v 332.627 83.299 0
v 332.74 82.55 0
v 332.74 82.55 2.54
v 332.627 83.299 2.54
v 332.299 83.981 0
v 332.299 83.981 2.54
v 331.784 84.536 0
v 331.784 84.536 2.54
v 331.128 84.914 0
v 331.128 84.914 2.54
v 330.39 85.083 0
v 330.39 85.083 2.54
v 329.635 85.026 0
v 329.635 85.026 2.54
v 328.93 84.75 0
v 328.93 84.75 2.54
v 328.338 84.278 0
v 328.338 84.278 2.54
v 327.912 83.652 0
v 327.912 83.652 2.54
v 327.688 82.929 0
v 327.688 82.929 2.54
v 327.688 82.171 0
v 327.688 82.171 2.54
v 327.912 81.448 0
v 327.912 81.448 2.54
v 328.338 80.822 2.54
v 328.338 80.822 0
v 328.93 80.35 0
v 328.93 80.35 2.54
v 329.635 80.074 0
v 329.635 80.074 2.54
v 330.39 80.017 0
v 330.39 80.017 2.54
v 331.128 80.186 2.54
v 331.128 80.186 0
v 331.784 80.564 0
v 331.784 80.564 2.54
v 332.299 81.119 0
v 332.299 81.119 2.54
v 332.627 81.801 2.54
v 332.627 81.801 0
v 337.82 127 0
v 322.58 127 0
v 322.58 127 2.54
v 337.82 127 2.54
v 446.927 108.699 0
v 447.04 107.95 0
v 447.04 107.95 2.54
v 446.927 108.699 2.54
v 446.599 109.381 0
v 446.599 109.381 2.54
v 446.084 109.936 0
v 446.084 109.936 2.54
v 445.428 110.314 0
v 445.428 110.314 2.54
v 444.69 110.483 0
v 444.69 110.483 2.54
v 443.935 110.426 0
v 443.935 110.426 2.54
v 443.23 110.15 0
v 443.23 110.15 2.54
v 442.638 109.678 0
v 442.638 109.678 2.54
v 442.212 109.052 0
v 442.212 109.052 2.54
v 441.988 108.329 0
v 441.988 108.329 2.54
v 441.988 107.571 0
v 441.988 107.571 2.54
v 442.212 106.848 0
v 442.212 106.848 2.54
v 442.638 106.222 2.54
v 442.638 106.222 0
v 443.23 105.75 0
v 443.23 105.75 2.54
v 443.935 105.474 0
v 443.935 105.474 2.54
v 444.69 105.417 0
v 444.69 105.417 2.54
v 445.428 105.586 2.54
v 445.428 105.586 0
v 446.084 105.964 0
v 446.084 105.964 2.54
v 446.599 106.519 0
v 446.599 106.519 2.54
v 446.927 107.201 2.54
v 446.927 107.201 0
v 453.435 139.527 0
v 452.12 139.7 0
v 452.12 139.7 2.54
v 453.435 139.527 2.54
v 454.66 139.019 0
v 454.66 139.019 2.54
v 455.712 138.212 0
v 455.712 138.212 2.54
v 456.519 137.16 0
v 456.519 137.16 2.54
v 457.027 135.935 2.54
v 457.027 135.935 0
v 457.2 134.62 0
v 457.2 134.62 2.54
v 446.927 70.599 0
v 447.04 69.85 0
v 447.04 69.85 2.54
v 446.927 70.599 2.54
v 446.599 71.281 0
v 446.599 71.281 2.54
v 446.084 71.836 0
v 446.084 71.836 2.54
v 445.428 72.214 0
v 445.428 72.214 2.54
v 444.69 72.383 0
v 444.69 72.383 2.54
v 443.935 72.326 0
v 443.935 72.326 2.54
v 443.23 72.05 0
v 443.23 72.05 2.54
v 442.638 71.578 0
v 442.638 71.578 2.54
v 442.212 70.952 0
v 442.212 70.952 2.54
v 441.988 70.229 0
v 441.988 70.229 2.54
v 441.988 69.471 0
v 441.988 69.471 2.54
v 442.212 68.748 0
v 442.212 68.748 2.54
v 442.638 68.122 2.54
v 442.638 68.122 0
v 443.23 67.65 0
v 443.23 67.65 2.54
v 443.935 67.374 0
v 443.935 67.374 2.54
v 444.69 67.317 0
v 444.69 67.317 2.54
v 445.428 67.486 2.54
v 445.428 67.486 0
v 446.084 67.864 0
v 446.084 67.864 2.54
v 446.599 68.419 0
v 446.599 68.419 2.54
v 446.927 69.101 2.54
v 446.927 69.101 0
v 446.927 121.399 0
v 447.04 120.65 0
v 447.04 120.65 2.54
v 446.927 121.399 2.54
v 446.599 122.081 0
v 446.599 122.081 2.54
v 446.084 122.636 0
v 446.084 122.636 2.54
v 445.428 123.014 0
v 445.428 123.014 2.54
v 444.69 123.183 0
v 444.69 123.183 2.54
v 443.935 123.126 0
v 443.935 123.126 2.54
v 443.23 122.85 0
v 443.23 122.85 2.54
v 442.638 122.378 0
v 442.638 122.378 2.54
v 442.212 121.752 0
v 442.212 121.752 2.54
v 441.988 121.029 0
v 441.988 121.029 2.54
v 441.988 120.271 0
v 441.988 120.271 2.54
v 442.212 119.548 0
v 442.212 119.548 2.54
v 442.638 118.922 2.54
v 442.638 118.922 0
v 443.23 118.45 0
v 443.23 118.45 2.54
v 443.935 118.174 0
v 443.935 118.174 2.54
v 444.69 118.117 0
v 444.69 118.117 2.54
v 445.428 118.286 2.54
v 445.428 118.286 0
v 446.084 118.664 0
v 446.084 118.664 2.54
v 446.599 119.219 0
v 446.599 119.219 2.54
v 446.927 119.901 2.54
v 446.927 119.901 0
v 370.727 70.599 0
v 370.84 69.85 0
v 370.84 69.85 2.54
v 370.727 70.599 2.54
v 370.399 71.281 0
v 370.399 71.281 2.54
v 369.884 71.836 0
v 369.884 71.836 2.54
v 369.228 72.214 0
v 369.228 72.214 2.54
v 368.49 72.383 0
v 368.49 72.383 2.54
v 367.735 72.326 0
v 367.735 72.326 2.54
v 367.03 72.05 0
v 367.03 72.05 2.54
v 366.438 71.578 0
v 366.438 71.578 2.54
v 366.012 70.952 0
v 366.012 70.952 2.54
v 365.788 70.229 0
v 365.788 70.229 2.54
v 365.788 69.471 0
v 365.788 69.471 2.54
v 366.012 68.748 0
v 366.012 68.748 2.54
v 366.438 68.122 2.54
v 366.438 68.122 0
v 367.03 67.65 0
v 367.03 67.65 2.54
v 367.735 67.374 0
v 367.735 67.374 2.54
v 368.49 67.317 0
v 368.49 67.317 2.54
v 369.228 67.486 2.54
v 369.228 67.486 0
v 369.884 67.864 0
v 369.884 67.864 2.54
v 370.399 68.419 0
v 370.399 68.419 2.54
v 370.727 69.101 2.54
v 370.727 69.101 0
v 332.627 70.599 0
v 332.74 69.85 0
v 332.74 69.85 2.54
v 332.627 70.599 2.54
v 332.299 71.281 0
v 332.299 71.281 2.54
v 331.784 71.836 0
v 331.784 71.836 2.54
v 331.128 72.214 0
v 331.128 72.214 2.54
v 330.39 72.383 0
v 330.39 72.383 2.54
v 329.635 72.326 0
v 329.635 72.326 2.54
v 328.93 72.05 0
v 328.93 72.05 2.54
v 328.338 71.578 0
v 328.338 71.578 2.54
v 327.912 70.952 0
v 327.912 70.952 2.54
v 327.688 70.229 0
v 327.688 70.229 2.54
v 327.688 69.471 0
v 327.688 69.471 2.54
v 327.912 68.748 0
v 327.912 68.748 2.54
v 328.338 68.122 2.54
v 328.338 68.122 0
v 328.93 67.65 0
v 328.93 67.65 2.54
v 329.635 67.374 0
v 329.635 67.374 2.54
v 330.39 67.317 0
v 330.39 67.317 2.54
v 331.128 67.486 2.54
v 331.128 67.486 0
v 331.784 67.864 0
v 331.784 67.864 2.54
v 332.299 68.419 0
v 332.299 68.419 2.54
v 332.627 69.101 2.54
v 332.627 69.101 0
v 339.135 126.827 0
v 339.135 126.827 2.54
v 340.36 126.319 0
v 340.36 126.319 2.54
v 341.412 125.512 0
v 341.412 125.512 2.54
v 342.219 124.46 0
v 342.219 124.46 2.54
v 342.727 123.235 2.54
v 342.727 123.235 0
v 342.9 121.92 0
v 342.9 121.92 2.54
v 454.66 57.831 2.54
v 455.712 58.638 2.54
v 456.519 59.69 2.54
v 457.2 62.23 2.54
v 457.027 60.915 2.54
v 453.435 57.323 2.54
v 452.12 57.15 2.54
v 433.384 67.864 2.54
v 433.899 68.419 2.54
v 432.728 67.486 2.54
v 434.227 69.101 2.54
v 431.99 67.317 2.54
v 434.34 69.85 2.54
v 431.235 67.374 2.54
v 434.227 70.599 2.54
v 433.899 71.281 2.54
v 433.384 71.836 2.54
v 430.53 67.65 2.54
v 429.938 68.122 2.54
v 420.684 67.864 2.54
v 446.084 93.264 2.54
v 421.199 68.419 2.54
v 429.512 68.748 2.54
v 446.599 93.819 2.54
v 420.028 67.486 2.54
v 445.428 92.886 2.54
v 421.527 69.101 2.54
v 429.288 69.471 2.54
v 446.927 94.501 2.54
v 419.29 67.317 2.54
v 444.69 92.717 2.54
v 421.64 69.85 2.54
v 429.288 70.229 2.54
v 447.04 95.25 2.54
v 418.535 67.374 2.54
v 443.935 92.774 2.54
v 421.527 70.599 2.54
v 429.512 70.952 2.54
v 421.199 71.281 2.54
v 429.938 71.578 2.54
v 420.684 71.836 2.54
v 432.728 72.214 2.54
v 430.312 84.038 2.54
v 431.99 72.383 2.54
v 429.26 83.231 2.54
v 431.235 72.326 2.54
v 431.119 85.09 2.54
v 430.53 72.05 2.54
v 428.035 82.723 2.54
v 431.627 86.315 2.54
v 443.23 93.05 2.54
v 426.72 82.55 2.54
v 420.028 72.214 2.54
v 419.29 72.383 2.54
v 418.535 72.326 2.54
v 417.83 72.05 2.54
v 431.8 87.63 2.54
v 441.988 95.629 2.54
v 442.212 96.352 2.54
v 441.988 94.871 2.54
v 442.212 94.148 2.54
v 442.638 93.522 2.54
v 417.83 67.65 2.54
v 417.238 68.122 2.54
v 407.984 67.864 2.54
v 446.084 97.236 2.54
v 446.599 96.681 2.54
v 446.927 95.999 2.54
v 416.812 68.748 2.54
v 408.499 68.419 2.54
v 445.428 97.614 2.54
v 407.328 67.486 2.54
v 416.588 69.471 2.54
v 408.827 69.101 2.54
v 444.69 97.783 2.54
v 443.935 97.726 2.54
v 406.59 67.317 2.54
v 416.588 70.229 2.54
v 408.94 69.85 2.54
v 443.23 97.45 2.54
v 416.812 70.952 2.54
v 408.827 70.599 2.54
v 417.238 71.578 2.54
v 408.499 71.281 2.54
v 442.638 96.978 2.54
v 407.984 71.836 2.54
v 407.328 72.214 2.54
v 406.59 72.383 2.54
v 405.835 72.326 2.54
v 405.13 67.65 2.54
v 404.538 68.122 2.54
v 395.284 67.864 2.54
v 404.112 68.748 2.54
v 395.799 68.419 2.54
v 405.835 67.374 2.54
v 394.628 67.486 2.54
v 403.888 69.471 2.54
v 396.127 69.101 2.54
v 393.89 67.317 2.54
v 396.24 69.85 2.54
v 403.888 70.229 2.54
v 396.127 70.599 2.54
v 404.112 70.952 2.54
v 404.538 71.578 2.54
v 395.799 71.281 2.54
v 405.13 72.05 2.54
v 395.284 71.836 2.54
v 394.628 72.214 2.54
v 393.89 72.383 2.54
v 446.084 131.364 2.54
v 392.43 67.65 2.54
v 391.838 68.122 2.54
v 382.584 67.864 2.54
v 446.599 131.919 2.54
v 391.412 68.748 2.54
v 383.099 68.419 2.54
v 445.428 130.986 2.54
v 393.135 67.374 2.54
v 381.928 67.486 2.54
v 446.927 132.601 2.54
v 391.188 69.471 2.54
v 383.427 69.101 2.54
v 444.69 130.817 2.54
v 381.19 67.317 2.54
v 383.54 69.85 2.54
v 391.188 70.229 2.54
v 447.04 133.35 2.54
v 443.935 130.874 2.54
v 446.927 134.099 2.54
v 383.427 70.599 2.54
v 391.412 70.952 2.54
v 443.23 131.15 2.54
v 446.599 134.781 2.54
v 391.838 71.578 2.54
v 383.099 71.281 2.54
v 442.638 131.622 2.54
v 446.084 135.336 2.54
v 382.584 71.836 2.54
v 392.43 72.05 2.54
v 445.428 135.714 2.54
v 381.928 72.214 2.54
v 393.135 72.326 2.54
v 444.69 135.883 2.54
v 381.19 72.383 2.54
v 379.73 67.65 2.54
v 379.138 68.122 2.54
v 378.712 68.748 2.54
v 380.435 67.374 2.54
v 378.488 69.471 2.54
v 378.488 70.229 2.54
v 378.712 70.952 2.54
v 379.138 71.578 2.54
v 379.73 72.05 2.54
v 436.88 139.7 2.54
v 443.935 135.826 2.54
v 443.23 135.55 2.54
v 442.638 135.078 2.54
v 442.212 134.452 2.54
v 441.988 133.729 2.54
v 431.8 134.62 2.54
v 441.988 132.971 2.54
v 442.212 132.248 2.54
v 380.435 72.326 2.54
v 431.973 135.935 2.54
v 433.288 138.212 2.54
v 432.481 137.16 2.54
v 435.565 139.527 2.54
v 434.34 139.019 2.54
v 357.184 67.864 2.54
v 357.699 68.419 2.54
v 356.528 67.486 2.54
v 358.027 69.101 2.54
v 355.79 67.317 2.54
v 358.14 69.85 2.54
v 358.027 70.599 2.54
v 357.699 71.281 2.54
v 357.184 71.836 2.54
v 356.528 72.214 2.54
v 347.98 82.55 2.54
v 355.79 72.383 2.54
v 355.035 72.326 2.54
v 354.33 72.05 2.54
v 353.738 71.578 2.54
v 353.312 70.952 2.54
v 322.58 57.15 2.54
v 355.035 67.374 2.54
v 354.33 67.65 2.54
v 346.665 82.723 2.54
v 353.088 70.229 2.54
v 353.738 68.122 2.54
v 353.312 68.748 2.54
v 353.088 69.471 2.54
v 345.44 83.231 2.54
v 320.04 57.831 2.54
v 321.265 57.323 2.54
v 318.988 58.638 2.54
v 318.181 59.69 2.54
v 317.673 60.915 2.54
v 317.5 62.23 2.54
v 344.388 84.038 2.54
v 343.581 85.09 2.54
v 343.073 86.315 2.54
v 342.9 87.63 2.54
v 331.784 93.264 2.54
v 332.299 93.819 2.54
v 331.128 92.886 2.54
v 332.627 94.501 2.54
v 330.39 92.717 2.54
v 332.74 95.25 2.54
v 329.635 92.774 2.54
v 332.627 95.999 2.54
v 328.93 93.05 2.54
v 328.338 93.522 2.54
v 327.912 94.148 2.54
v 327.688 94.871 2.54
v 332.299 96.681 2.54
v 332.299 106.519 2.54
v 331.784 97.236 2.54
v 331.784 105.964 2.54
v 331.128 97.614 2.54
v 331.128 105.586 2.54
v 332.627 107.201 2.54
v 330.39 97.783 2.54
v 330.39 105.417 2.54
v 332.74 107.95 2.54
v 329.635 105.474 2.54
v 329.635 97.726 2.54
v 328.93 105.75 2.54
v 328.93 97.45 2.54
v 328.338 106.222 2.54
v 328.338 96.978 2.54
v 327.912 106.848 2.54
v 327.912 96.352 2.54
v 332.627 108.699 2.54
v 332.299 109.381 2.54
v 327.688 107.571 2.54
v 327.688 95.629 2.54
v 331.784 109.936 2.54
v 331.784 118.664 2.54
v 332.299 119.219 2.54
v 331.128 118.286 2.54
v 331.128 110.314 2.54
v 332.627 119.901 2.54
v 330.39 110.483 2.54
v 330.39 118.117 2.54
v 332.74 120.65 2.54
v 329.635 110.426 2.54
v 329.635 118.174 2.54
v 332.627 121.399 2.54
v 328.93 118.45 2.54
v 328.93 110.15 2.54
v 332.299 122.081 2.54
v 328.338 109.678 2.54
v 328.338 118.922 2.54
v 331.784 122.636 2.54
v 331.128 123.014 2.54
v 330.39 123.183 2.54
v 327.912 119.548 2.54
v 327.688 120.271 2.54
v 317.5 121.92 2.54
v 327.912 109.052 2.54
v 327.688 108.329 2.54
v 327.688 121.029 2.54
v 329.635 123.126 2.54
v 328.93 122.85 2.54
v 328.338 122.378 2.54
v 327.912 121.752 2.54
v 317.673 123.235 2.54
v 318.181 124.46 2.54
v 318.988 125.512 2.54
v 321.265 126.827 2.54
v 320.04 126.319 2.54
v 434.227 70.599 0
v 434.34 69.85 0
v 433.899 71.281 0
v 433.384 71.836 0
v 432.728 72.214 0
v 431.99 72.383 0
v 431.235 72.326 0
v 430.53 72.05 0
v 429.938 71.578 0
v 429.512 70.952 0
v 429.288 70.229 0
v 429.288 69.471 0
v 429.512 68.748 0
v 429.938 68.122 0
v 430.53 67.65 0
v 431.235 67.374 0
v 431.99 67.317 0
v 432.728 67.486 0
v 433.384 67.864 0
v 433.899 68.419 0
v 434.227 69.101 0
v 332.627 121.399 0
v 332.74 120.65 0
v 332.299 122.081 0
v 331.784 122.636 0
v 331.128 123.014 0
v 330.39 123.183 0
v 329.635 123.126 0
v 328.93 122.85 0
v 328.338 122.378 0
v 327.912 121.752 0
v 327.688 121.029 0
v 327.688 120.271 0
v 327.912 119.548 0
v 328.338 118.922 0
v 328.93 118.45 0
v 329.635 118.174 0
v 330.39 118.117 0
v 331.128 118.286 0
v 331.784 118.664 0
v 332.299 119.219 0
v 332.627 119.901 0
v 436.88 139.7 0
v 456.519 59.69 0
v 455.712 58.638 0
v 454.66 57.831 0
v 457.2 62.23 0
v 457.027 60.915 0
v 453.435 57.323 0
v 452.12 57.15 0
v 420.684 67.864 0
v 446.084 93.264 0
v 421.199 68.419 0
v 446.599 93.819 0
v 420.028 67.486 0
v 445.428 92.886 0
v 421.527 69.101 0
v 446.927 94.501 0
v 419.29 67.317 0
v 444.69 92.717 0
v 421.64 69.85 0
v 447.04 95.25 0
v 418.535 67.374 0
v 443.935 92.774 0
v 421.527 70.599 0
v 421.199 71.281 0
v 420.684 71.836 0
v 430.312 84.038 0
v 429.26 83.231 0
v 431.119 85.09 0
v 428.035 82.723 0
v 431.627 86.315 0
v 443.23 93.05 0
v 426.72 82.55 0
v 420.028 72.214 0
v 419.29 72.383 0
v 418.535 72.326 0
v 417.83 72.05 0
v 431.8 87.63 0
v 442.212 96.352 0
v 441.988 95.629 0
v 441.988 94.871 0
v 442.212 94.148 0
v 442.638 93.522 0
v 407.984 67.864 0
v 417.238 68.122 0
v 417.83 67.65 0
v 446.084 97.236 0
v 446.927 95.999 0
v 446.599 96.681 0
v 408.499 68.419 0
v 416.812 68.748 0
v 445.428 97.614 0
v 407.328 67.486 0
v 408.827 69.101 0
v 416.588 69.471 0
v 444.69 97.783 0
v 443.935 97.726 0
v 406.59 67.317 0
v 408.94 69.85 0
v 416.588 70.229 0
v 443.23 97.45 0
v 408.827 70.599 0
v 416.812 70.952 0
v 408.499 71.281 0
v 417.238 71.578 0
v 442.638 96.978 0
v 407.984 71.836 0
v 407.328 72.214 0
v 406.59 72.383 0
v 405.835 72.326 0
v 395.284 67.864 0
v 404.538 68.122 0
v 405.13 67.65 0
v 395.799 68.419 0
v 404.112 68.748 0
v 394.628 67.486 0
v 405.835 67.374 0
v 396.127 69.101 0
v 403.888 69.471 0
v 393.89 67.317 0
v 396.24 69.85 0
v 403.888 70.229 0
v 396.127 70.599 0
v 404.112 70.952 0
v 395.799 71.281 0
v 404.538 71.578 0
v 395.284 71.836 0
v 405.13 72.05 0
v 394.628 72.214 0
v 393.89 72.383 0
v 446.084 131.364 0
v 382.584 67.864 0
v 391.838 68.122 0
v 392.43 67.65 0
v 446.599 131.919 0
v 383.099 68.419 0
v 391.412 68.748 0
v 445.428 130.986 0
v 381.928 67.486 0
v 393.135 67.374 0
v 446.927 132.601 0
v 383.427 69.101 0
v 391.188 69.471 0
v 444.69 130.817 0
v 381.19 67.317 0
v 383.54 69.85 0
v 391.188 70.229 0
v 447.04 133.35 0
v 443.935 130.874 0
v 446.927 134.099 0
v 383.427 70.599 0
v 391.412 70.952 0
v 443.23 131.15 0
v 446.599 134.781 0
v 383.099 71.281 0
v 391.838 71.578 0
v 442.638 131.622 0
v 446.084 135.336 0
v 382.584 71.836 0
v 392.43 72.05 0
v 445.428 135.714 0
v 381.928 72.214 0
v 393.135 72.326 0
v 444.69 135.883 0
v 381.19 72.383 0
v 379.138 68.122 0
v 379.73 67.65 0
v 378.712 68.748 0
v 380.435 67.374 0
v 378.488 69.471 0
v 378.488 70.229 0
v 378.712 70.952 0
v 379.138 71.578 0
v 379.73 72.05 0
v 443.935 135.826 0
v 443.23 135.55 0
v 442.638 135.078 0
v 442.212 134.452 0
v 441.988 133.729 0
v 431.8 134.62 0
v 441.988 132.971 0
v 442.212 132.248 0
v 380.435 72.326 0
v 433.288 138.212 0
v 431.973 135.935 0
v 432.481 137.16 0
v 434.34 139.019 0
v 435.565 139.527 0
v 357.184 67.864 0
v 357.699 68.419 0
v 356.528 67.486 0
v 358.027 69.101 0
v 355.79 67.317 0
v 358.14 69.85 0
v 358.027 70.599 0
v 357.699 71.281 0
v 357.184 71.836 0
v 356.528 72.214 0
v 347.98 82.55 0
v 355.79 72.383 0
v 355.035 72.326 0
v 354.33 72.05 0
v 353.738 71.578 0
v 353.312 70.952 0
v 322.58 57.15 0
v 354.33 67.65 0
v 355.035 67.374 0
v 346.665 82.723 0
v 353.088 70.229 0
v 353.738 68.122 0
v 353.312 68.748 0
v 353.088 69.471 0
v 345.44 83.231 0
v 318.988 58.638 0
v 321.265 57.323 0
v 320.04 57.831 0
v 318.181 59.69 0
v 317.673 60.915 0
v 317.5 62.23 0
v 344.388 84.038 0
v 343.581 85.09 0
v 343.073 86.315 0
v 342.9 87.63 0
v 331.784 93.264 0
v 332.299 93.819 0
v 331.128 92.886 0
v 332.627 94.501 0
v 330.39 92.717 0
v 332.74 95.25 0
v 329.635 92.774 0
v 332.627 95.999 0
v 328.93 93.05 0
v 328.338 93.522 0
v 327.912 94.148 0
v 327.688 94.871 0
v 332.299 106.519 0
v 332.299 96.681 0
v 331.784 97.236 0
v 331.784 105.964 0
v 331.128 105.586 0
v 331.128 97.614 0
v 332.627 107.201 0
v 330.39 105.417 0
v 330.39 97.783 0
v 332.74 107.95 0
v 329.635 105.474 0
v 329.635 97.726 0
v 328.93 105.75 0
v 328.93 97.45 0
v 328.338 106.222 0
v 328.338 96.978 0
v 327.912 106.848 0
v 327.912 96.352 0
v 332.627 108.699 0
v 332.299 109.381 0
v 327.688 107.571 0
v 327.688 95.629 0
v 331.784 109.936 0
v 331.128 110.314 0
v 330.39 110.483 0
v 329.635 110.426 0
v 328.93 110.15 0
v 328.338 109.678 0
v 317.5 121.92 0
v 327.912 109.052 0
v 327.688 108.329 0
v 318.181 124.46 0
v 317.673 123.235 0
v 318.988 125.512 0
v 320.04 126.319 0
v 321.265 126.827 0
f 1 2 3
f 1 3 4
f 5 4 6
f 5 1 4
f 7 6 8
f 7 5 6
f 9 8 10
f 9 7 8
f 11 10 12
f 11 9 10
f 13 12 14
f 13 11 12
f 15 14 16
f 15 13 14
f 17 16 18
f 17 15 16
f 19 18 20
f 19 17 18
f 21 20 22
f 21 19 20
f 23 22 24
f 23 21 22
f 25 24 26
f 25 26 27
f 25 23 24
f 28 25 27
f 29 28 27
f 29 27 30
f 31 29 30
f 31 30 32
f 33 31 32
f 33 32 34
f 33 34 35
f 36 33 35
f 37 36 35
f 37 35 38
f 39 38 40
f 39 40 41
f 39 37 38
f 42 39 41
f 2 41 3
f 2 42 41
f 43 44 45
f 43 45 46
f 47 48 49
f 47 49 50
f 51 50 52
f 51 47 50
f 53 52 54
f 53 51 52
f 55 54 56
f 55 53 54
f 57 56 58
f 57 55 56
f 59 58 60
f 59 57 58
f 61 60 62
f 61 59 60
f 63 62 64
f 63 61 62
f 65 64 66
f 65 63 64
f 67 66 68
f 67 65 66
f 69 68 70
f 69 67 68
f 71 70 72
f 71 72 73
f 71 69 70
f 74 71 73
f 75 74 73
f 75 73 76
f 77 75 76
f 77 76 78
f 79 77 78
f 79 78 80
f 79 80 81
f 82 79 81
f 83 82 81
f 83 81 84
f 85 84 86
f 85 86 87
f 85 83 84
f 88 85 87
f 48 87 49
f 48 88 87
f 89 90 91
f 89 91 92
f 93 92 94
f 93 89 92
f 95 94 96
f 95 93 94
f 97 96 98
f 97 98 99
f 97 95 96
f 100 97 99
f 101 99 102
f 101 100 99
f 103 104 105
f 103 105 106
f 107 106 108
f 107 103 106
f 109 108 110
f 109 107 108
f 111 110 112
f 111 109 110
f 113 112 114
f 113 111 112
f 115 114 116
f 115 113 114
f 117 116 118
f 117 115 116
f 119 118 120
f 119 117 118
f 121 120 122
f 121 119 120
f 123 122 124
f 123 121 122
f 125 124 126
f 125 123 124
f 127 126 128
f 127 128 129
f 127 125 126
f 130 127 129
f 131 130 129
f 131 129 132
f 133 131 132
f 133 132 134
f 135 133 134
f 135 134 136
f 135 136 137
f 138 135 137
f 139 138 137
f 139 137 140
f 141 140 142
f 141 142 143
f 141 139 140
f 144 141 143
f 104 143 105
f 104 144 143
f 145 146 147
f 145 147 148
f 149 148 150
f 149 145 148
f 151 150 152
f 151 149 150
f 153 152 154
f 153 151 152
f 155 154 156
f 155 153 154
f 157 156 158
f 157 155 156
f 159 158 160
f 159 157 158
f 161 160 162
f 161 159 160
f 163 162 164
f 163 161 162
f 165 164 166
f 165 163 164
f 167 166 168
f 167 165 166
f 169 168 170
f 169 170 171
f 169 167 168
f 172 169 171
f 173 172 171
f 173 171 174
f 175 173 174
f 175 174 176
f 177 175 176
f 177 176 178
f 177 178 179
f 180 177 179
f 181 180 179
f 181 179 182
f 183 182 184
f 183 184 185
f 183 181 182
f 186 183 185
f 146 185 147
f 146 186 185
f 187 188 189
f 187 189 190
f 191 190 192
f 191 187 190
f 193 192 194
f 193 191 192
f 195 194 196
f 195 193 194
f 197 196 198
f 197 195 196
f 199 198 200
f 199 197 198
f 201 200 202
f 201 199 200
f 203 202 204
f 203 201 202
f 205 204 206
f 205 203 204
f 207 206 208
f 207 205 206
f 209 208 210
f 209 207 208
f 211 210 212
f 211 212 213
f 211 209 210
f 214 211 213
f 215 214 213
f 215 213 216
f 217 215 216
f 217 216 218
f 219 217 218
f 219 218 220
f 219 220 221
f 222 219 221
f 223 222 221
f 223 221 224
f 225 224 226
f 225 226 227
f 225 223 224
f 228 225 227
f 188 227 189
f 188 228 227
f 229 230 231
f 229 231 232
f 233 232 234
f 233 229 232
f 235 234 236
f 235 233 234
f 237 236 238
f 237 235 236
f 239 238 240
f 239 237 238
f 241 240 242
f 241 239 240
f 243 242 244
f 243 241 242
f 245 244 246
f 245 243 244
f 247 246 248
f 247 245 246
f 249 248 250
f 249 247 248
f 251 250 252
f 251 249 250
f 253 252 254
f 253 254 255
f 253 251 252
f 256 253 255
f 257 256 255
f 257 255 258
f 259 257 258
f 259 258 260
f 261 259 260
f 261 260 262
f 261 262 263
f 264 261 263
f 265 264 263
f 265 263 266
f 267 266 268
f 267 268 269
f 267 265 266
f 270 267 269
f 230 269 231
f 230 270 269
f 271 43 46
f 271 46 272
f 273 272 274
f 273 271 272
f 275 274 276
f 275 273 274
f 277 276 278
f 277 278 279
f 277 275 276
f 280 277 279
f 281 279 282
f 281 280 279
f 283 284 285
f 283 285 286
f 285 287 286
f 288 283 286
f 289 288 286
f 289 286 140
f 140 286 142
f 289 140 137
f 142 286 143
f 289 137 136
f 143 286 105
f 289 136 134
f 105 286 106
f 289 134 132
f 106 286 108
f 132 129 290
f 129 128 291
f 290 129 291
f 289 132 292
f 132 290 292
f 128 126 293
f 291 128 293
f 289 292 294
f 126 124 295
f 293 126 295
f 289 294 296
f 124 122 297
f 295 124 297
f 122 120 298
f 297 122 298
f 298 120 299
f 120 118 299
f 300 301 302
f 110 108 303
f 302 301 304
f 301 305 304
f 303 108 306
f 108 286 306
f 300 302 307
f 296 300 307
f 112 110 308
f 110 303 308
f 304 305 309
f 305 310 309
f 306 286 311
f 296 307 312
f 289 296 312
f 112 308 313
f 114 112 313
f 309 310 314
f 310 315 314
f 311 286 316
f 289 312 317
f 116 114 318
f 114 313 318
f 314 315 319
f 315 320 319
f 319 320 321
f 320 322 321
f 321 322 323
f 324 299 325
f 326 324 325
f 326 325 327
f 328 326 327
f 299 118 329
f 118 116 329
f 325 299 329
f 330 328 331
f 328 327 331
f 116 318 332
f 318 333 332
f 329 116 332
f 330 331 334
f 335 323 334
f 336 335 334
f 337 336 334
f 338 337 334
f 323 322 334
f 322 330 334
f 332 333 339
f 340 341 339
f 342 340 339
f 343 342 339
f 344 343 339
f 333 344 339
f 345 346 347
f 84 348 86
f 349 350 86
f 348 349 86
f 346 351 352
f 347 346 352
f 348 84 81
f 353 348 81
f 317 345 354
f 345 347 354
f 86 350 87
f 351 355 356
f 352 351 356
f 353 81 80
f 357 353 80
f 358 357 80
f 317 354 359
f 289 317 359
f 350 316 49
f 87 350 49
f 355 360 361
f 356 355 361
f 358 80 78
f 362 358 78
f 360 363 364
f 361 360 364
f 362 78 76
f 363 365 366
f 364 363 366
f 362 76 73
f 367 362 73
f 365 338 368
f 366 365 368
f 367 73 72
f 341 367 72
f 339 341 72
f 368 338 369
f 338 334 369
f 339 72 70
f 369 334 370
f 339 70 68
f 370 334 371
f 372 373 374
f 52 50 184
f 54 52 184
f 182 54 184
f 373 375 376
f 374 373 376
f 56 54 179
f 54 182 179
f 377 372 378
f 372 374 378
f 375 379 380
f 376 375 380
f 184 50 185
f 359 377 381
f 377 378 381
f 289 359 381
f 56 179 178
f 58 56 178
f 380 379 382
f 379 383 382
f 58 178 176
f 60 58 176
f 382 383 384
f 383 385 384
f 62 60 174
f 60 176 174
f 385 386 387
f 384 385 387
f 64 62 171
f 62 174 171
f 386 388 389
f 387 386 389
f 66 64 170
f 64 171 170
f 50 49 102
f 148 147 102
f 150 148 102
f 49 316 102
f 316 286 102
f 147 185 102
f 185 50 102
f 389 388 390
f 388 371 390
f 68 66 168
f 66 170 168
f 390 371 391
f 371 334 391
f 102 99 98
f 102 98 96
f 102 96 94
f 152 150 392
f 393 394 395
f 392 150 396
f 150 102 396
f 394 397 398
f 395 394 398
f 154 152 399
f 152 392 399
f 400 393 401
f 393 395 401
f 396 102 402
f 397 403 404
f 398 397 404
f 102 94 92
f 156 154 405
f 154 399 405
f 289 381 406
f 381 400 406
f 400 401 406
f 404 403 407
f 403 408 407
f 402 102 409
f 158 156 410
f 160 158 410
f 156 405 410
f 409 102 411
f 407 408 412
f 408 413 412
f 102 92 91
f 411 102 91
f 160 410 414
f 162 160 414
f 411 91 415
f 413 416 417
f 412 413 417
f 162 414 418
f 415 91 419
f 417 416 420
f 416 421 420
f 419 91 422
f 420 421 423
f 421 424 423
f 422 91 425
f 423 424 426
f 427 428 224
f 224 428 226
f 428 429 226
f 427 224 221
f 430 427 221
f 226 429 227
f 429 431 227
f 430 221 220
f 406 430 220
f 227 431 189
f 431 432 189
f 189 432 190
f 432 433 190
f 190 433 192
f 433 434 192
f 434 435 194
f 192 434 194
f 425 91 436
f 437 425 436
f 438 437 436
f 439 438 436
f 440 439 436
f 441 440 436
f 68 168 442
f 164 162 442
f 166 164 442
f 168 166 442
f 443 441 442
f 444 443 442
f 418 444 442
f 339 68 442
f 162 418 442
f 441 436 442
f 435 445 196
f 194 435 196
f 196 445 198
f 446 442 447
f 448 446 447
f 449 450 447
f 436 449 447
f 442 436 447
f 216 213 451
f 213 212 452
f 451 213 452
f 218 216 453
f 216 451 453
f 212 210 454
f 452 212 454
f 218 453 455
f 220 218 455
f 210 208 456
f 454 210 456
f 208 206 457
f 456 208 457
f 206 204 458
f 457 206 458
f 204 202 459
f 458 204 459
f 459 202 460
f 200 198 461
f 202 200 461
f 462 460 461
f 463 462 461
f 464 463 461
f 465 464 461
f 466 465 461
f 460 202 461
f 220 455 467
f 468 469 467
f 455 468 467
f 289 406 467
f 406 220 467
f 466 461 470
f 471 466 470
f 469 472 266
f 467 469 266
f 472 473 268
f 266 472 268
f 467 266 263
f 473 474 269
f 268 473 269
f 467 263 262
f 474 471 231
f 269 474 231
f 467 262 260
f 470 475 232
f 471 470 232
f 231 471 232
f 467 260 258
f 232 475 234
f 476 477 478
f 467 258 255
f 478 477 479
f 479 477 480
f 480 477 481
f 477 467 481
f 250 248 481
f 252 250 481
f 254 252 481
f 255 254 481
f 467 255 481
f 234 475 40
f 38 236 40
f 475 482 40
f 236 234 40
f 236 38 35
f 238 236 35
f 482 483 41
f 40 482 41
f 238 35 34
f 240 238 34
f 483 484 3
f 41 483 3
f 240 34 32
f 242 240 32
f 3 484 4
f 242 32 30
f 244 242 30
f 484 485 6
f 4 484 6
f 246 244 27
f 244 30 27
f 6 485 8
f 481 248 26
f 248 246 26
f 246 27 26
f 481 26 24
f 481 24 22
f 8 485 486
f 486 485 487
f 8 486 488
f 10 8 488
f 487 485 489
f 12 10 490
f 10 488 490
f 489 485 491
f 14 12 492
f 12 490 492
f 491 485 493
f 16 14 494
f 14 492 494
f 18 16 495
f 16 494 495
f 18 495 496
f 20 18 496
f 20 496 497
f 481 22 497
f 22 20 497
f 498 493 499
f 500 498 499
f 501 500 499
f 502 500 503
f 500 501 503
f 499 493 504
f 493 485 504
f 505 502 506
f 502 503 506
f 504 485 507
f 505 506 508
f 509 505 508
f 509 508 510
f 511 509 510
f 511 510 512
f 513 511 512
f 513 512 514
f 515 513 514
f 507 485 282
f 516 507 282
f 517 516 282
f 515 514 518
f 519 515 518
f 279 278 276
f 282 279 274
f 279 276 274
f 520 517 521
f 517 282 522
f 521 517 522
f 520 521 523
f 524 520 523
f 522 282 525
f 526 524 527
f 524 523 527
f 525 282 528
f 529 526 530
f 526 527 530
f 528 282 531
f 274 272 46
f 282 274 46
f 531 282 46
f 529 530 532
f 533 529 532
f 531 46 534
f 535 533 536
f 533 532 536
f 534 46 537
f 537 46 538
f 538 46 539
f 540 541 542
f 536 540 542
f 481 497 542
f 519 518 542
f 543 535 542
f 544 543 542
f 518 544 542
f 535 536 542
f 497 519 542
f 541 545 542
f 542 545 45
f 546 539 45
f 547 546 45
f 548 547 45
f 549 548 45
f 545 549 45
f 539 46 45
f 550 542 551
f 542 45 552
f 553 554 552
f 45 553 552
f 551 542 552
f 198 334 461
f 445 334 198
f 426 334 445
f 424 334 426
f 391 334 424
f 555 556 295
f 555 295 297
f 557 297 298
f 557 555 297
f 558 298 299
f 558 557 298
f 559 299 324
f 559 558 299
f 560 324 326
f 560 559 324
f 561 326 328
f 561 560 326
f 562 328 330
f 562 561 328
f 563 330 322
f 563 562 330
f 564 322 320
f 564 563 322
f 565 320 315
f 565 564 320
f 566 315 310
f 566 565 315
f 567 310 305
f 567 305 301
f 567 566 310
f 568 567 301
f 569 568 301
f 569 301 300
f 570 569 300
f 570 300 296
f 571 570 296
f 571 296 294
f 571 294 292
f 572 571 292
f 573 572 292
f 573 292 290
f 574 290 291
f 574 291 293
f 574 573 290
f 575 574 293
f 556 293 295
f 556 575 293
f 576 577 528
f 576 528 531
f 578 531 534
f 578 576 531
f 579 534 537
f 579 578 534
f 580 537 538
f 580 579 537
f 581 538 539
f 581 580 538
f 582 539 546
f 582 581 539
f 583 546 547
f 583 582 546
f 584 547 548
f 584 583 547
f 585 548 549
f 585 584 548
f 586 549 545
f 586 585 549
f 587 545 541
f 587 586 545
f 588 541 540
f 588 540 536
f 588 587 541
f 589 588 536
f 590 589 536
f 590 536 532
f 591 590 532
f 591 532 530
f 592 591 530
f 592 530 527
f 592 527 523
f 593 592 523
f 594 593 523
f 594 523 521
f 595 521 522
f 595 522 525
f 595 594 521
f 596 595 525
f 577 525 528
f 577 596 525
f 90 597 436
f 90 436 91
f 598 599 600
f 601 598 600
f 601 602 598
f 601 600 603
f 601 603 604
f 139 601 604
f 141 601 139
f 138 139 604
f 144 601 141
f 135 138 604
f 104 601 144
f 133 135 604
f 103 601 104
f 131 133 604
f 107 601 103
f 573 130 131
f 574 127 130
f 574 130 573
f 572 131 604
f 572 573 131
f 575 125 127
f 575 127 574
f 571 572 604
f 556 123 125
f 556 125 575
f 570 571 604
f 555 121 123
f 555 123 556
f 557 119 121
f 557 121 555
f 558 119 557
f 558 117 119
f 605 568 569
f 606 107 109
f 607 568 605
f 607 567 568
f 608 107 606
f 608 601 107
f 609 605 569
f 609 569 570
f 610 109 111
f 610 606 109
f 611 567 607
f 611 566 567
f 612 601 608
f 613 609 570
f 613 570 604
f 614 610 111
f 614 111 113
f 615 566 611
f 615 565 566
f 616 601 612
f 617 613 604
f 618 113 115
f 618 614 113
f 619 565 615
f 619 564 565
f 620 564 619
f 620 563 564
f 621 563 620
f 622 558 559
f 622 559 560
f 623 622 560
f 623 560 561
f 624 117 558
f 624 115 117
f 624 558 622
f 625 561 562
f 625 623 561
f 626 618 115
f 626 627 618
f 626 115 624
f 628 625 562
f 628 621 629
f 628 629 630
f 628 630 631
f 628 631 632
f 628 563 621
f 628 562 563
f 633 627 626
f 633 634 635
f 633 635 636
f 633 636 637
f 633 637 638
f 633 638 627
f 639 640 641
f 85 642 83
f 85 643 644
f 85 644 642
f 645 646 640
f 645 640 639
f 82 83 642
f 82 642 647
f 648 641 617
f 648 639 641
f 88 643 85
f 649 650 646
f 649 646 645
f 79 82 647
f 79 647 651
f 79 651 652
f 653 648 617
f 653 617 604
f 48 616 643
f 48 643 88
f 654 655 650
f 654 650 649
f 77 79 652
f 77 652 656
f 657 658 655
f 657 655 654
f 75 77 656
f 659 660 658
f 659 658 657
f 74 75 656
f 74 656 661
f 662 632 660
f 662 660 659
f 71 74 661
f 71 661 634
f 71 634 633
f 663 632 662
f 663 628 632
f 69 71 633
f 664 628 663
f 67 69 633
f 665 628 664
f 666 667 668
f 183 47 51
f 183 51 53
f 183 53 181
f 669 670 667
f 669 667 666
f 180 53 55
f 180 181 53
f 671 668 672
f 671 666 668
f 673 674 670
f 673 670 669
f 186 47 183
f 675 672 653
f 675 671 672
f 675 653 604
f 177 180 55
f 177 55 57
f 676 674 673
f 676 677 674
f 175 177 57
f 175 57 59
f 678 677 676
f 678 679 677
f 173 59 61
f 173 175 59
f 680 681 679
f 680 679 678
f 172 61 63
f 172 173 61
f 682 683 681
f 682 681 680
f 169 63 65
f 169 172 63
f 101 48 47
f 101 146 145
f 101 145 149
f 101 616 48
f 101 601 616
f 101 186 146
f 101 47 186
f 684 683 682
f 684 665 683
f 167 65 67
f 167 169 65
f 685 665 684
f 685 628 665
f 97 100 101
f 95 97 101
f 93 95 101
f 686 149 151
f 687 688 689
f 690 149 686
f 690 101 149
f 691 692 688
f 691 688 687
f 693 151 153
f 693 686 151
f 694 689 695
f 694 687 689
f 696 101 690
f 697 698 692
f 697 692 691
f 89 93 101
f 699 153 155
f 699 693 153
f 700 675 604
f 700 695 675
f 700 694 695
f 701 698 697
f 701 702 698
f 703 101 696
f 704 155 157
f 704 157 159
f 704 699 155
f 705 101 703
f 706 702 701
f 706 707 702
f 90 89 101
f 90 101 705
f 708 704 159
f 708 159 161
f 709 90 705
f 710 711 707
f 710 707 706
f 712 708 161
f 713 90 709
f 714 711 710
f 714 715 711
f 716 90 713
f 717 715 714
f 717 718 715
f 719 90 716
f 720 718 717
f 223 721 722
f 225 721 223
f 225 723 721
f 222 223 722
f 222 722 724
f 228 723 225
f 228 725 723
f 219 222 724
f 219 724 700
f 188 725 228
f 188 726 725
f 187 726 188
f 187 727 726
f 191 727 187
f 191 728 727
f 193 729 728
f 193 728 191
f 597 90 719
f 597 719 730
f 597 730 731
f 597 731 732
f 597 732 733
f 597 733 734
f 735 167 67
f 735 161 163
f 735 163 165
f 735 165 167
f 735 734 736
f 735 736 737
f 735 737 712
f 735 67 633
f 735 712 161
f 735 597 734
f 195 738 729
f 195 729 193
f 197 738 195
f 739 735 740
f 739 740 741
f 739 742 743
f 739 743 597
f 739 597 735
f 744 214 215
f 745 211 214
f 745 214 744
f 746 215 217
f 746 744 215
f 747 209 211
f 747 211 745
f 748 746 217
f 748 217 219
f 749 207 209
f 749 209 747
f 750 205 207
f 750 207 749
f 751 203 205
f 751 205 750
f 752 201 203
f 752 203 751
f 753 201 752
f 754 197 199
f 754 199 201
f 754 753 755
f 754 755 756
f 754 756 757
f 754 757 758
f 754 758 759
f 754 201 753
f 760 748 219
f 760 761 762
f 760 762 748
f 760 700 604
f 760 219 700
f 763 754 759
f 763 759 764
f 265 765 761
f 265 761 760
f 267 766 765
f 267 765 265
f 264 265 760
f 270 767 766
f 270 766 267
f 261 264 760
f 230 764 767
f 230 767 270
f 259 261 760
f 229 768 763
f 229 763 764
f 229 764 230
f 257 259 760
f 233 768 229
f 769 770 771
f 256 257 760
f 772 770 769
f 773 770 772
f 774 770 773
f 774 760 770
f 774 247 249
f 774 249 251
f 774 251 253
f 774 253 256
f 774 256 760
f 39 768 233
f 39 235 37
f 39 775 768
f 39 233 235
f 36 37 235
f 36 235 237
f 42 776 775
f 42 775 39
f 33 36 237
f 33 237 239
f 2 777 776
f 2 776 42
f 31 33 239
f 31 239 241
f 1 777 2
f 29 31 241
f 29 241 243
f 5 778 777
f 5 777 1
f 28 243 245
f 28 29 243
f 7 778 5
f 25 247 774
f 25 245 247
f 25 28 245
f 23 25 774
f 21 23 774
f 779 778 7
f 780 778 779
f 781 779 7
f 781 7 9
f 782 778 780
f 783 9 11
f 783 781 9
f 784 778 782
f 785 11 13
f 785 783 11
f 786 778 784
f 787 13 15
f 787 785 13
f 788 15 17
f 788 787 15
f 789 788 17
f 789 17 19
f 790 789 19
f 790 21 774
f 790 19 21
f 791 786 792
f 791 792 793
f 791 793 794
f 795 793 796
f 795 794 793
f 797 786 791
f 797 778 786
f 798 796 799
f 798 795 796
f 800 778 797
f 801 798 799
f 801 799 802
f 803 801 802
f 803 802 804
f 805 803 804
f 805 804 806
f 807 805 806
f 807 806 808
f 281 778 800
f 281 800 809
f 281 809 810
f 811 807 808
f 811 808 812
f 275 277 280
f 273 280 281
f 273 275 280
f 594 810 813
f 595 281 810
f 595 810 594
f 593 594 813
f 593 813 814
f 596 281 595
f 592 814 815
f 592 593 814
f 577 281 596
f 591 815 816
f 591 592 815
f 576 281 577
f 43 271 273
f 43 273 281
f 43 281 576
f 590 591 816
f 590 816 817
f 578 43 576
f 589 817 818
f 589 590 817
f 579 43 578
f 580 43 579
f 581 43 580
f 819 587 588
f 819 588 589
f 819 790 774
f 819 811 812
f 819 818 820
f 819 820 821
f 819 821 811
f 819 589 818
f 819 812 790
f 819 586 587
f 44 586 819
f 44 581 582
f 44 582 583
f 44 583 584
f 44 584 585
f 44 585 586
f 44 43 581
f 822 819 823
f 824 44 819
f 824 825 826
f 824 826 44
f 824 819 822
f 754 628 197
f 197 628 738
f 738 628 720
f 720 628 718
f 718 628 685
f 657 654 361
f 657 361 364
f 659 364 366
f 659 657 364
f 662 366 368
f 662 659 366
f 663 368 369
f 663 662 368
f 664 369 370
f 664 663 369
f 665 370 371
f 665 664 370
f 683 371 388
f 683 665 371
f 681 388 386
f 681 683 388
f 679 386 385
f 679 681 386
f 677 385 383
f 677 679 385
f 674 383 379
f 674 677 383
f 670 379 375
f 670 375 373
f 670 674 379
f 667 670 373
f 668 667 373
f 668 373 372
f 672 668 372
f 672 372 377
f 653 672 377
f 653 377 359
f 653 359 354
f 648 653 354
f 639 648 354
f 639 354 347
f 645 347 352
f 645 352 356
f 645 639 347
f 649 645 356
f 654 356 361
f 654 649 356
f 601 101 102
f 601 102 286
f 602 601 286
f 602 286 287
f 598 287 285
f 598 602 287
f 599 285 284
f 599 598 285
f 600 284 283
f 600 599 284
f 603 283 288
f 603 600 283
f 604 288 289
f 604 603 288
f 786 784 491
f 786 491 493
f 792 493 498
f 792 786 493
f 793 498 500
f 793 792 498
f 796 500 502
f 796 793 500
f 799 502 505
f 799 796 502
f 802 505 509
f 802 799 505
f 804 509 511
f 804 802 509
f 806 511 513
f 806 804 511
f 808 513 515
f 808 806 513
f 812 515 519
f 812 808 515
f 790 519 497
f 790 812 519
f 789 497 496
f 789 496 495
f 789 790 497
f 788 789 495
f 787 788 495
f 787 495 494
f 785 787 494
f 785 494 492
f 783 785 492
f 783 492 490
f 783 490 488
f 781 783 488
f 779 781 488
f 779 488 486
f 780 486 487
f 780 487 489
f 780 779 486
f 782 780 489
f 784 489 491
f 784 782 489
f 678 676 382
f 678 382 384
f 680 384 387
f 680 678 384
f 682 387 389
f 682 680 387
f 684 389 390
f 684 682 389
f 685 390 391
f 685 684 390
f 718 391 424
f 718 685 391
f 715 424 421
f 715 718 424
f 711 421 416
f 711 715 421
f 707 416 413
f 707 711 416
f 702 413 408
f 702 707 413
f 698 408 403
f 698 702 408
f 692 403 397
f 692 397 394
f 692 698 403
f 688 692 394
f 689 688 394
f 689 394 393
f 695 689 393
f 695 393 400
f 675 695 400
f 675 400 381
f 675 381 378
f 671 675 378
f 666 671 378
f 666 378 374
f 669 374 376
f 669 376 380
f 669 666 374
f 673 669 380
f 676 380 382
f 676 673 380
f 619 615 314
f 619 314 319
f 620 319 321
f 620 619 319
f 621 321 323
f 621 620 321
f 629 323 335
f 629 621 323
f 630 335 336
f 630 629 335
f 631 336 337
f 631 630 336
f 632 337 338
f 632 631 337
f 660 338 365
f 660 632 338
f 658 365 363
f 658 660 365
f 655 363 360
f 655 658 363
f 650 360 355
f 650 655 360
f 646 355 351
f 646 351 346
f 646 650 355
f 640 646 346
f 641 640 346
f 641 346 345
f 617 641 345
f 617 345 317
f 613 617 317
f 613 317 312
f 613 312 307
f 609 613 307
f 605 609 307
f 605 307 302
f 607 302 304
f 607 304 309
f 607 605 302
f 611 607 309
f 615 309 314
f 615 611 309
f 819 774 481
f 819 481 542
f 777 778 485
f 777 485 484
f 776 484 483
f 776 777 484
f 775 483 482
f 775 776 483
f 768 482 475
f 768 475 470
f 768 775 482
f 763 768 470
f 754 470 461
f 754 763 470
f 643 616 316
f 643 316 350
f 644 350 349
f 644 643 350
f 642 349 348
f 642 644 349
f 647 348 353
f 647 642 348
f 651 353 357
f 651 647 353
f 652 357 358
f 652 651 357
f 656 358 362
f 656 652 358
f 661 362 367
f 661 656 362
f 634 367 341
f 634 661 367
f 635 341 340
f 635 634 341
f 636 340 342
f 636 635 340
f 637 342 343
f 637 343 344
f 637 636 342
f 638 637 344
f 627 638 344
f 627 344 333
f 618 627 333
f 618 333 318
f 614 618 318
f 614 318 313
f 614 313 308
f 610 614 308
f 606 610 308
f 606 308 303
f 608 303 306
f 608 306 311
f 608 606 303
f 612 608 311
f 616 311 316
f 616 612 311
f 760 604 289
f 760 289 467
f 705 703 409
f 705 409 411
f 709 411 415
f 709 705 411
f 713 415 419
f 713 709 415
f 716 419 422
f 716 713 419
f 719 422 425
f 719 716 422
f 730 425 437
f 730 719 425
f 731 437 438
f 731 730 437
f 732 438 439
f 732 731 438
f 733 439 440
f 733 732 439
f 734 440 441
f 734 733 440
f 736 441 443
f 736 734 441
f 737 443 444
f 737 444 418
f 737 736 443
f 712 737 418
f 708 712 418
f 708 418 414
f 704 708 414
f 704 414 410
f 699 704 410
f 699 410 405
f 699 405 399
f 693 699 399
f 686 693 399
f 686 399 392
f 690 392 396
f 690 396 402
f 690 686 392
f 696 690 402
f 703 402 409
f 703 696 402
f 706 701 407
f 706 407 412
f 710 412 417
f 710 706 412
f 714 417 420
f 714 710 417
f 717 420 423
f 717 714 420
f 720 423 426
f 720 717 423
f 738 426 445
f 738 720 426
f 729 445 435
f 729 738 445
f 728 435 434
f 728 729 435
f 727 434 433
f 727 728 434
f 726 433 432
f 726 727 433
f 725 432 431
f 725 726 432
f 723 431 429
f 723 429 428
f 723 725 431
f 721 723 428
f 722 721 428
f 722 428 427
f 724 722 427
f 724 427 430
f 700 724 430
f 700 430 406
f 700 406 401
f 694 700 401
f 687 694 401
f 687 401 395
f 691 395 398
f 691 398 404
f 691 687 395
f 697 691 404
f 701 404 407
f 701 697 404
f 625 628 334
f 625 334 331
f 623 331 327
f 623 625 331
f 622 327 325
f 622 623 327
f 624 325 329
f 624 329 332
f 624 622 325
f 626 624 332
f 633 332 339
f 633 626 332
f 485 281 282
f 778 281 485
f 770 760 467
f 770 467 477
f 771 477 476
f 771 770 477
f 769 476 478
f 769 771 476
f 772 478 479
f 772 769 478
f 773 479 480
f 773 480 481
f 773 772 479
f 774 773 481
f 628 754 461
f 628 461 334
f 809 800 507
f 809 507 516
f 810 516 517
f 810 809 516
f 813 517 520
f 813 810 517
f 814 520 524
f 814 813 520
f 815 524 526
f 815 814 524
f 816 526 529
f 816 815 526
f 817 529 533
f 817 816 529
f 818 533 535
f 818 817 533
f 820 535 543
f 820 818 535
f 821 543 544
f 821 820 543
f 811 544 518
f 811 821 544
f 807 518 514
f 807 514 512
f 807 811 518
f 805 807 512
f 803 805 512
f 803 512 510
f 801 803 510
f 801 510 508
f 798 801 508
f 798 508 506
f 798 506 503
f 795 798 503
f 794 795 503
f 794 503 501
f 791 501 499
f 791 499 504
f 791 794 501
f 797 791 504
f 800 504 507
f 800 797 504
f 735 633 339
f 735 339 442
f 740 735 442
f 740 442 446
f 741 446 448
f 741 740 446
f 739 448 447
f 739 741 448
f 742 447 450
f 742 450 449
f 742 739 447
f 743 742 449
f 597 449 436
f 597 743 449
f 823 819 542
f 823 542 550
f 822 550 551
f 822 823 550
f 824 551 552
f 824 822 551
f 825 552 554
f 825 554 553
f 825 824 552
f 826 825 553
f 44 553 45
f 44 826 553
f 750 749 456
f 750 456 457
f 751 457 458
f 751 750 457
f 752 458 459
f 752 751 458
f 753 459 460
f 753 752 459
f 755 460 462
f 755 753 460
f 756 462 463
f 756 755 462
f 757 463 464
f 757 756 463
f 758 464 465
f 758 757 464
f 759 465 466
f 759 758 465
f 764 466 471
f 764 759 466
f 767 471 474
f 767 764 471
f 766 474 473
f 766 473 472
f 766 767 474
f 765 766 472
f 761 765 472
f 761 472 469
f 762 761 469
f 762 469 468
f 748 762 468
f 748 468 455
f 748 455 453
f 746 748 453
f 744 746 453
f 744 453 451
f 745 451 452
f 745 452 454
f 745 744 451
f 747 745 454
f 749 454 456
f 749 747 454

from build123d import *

# Parameters (mm, degrees)
SKETCH2_R           = 2.54
BOSS_EXTRUDE1_DEPTH = 2.54


with BuildPart() as part:
    # Sketch2 → Boss-Extrude1 (new body)
    with BuildSketch(Plane.XY):
        with BuildLine():
            Line((317.5, 62.23), (317.5, 121.92))
            ThreePointArc((317.5, 121.92), (318.987897552, 125.512102448), (322.58, 127))
            Line((322.58, 127), (337.82, 127))
            ThreePointArc((337.82, 127), (341.412102448, 125.512102448), (342.9, 121.92))
            Line((342.9, 121.92), (342.9, 87.63))
            ThreePointArc((342.9, 87.63), (344.387897552, 84.037897552), (347.98, 82.55))
            Line((347.98, 82.55), (426.72, 82.55))
            ThreePointArc((426.72, 82.55), (430.312102448, 84.037897552), (431.8, 87.63))
            Line((431.8, 87.63), (431.8, 134.62))
            ThreePointArc((431.8, 134.62), (433.287897552, 138.212102448), (436.88, 139.7))
            Line((436.88, 139.7), (452.12, 139.7))
            ThreePointArc((452.12, 139.7), (455.712102448, 138.212102448), (457.2, 134.62))
            Line((457.2, 134.62), (457.2, 82.55))
            Line((457.2, 82.55), (457.2, 62.23))
            ThreePointArc((457.2, 62.23), (455.712102448, 58.637897552), (452.12, 57.15))
            Line((452.12, 57.15), (322.58, 57.15))
            ThreePointArc((322.58, 57.15), (318.987897552, 58.637897552), (317.5, 62.23))
        make_face()
        with Locations((444.5, 133.35)):
            Circle(SKETCH2_R, mode=Mode.SUBTRACT)
        with Locations((444.5, 120.65)):
            Circle(SKETCH2_R, mode=Mode.SUBTRACT)
        with Locations((444.5, 107.95)):
            Circle(SKETCH2_R, mode=Mode.SUBTRACT)
        with Locations((444.5, 95.25)):
            Circle(SKETCH2_R, mode=Mode.SUBTRACT)
        with Locations((444.5, 69.85)):
            Circle(SKETCH2_R, mode=Mode.SUBTRACT)
        with Locations((431.8, 69.85)):
            Circle(SKETCH2_R, mode=Mode.SUBTRACT)
        with Locations((419.1, 69.85)):
            Circle(SKETCH2_R, mode=Mode.SUBTRACT)
        with Locations((406.4, 69.85)):
            Circle(SKETCH2_R, mode=Mode.SUBTRACT)
        with Locations((393.7, 69.85)):
            Circle(SKETCH2_R, mode=Mode.SUBTRACT)
        with Locations((381, 69.85)):
            Circle(SKETCH2_R, mode=Mode.SUBTRACT)
        with Locations((368.3, 69.85)):
            Circle(SKETCH2_R, mode=Mode.SUBTRACT)
        with Locations((355.6, 69.85)):
            Circle(SKETCH2_R, mode=Mode.SUBTRACT)
        with Locations((330.2, 69.85)):
            Circle(SKETCH2_R, mode=Mode.SUBTRACT)
        with Locations((330.2, 82.55)):
            Circle(SKETCH2_R, mode=Mode.SUBTRACT)
        with Locations((330.2, 95.25)):
            Circle(SKETCH2_R, mode=Mode.SUBTRACT)
        with Locations((330.2, 107.95)):
            Circle(SKETCH2_R, mode=Mode.SUBTRACT)
        with Locations((330.2, 120.65)):
            Circle(SKETCH2_R, mode=Mode.SUBTRACT)
    extrude(amount=BOSS_EXTRUDE1_DEPTH)


solid = part.part
